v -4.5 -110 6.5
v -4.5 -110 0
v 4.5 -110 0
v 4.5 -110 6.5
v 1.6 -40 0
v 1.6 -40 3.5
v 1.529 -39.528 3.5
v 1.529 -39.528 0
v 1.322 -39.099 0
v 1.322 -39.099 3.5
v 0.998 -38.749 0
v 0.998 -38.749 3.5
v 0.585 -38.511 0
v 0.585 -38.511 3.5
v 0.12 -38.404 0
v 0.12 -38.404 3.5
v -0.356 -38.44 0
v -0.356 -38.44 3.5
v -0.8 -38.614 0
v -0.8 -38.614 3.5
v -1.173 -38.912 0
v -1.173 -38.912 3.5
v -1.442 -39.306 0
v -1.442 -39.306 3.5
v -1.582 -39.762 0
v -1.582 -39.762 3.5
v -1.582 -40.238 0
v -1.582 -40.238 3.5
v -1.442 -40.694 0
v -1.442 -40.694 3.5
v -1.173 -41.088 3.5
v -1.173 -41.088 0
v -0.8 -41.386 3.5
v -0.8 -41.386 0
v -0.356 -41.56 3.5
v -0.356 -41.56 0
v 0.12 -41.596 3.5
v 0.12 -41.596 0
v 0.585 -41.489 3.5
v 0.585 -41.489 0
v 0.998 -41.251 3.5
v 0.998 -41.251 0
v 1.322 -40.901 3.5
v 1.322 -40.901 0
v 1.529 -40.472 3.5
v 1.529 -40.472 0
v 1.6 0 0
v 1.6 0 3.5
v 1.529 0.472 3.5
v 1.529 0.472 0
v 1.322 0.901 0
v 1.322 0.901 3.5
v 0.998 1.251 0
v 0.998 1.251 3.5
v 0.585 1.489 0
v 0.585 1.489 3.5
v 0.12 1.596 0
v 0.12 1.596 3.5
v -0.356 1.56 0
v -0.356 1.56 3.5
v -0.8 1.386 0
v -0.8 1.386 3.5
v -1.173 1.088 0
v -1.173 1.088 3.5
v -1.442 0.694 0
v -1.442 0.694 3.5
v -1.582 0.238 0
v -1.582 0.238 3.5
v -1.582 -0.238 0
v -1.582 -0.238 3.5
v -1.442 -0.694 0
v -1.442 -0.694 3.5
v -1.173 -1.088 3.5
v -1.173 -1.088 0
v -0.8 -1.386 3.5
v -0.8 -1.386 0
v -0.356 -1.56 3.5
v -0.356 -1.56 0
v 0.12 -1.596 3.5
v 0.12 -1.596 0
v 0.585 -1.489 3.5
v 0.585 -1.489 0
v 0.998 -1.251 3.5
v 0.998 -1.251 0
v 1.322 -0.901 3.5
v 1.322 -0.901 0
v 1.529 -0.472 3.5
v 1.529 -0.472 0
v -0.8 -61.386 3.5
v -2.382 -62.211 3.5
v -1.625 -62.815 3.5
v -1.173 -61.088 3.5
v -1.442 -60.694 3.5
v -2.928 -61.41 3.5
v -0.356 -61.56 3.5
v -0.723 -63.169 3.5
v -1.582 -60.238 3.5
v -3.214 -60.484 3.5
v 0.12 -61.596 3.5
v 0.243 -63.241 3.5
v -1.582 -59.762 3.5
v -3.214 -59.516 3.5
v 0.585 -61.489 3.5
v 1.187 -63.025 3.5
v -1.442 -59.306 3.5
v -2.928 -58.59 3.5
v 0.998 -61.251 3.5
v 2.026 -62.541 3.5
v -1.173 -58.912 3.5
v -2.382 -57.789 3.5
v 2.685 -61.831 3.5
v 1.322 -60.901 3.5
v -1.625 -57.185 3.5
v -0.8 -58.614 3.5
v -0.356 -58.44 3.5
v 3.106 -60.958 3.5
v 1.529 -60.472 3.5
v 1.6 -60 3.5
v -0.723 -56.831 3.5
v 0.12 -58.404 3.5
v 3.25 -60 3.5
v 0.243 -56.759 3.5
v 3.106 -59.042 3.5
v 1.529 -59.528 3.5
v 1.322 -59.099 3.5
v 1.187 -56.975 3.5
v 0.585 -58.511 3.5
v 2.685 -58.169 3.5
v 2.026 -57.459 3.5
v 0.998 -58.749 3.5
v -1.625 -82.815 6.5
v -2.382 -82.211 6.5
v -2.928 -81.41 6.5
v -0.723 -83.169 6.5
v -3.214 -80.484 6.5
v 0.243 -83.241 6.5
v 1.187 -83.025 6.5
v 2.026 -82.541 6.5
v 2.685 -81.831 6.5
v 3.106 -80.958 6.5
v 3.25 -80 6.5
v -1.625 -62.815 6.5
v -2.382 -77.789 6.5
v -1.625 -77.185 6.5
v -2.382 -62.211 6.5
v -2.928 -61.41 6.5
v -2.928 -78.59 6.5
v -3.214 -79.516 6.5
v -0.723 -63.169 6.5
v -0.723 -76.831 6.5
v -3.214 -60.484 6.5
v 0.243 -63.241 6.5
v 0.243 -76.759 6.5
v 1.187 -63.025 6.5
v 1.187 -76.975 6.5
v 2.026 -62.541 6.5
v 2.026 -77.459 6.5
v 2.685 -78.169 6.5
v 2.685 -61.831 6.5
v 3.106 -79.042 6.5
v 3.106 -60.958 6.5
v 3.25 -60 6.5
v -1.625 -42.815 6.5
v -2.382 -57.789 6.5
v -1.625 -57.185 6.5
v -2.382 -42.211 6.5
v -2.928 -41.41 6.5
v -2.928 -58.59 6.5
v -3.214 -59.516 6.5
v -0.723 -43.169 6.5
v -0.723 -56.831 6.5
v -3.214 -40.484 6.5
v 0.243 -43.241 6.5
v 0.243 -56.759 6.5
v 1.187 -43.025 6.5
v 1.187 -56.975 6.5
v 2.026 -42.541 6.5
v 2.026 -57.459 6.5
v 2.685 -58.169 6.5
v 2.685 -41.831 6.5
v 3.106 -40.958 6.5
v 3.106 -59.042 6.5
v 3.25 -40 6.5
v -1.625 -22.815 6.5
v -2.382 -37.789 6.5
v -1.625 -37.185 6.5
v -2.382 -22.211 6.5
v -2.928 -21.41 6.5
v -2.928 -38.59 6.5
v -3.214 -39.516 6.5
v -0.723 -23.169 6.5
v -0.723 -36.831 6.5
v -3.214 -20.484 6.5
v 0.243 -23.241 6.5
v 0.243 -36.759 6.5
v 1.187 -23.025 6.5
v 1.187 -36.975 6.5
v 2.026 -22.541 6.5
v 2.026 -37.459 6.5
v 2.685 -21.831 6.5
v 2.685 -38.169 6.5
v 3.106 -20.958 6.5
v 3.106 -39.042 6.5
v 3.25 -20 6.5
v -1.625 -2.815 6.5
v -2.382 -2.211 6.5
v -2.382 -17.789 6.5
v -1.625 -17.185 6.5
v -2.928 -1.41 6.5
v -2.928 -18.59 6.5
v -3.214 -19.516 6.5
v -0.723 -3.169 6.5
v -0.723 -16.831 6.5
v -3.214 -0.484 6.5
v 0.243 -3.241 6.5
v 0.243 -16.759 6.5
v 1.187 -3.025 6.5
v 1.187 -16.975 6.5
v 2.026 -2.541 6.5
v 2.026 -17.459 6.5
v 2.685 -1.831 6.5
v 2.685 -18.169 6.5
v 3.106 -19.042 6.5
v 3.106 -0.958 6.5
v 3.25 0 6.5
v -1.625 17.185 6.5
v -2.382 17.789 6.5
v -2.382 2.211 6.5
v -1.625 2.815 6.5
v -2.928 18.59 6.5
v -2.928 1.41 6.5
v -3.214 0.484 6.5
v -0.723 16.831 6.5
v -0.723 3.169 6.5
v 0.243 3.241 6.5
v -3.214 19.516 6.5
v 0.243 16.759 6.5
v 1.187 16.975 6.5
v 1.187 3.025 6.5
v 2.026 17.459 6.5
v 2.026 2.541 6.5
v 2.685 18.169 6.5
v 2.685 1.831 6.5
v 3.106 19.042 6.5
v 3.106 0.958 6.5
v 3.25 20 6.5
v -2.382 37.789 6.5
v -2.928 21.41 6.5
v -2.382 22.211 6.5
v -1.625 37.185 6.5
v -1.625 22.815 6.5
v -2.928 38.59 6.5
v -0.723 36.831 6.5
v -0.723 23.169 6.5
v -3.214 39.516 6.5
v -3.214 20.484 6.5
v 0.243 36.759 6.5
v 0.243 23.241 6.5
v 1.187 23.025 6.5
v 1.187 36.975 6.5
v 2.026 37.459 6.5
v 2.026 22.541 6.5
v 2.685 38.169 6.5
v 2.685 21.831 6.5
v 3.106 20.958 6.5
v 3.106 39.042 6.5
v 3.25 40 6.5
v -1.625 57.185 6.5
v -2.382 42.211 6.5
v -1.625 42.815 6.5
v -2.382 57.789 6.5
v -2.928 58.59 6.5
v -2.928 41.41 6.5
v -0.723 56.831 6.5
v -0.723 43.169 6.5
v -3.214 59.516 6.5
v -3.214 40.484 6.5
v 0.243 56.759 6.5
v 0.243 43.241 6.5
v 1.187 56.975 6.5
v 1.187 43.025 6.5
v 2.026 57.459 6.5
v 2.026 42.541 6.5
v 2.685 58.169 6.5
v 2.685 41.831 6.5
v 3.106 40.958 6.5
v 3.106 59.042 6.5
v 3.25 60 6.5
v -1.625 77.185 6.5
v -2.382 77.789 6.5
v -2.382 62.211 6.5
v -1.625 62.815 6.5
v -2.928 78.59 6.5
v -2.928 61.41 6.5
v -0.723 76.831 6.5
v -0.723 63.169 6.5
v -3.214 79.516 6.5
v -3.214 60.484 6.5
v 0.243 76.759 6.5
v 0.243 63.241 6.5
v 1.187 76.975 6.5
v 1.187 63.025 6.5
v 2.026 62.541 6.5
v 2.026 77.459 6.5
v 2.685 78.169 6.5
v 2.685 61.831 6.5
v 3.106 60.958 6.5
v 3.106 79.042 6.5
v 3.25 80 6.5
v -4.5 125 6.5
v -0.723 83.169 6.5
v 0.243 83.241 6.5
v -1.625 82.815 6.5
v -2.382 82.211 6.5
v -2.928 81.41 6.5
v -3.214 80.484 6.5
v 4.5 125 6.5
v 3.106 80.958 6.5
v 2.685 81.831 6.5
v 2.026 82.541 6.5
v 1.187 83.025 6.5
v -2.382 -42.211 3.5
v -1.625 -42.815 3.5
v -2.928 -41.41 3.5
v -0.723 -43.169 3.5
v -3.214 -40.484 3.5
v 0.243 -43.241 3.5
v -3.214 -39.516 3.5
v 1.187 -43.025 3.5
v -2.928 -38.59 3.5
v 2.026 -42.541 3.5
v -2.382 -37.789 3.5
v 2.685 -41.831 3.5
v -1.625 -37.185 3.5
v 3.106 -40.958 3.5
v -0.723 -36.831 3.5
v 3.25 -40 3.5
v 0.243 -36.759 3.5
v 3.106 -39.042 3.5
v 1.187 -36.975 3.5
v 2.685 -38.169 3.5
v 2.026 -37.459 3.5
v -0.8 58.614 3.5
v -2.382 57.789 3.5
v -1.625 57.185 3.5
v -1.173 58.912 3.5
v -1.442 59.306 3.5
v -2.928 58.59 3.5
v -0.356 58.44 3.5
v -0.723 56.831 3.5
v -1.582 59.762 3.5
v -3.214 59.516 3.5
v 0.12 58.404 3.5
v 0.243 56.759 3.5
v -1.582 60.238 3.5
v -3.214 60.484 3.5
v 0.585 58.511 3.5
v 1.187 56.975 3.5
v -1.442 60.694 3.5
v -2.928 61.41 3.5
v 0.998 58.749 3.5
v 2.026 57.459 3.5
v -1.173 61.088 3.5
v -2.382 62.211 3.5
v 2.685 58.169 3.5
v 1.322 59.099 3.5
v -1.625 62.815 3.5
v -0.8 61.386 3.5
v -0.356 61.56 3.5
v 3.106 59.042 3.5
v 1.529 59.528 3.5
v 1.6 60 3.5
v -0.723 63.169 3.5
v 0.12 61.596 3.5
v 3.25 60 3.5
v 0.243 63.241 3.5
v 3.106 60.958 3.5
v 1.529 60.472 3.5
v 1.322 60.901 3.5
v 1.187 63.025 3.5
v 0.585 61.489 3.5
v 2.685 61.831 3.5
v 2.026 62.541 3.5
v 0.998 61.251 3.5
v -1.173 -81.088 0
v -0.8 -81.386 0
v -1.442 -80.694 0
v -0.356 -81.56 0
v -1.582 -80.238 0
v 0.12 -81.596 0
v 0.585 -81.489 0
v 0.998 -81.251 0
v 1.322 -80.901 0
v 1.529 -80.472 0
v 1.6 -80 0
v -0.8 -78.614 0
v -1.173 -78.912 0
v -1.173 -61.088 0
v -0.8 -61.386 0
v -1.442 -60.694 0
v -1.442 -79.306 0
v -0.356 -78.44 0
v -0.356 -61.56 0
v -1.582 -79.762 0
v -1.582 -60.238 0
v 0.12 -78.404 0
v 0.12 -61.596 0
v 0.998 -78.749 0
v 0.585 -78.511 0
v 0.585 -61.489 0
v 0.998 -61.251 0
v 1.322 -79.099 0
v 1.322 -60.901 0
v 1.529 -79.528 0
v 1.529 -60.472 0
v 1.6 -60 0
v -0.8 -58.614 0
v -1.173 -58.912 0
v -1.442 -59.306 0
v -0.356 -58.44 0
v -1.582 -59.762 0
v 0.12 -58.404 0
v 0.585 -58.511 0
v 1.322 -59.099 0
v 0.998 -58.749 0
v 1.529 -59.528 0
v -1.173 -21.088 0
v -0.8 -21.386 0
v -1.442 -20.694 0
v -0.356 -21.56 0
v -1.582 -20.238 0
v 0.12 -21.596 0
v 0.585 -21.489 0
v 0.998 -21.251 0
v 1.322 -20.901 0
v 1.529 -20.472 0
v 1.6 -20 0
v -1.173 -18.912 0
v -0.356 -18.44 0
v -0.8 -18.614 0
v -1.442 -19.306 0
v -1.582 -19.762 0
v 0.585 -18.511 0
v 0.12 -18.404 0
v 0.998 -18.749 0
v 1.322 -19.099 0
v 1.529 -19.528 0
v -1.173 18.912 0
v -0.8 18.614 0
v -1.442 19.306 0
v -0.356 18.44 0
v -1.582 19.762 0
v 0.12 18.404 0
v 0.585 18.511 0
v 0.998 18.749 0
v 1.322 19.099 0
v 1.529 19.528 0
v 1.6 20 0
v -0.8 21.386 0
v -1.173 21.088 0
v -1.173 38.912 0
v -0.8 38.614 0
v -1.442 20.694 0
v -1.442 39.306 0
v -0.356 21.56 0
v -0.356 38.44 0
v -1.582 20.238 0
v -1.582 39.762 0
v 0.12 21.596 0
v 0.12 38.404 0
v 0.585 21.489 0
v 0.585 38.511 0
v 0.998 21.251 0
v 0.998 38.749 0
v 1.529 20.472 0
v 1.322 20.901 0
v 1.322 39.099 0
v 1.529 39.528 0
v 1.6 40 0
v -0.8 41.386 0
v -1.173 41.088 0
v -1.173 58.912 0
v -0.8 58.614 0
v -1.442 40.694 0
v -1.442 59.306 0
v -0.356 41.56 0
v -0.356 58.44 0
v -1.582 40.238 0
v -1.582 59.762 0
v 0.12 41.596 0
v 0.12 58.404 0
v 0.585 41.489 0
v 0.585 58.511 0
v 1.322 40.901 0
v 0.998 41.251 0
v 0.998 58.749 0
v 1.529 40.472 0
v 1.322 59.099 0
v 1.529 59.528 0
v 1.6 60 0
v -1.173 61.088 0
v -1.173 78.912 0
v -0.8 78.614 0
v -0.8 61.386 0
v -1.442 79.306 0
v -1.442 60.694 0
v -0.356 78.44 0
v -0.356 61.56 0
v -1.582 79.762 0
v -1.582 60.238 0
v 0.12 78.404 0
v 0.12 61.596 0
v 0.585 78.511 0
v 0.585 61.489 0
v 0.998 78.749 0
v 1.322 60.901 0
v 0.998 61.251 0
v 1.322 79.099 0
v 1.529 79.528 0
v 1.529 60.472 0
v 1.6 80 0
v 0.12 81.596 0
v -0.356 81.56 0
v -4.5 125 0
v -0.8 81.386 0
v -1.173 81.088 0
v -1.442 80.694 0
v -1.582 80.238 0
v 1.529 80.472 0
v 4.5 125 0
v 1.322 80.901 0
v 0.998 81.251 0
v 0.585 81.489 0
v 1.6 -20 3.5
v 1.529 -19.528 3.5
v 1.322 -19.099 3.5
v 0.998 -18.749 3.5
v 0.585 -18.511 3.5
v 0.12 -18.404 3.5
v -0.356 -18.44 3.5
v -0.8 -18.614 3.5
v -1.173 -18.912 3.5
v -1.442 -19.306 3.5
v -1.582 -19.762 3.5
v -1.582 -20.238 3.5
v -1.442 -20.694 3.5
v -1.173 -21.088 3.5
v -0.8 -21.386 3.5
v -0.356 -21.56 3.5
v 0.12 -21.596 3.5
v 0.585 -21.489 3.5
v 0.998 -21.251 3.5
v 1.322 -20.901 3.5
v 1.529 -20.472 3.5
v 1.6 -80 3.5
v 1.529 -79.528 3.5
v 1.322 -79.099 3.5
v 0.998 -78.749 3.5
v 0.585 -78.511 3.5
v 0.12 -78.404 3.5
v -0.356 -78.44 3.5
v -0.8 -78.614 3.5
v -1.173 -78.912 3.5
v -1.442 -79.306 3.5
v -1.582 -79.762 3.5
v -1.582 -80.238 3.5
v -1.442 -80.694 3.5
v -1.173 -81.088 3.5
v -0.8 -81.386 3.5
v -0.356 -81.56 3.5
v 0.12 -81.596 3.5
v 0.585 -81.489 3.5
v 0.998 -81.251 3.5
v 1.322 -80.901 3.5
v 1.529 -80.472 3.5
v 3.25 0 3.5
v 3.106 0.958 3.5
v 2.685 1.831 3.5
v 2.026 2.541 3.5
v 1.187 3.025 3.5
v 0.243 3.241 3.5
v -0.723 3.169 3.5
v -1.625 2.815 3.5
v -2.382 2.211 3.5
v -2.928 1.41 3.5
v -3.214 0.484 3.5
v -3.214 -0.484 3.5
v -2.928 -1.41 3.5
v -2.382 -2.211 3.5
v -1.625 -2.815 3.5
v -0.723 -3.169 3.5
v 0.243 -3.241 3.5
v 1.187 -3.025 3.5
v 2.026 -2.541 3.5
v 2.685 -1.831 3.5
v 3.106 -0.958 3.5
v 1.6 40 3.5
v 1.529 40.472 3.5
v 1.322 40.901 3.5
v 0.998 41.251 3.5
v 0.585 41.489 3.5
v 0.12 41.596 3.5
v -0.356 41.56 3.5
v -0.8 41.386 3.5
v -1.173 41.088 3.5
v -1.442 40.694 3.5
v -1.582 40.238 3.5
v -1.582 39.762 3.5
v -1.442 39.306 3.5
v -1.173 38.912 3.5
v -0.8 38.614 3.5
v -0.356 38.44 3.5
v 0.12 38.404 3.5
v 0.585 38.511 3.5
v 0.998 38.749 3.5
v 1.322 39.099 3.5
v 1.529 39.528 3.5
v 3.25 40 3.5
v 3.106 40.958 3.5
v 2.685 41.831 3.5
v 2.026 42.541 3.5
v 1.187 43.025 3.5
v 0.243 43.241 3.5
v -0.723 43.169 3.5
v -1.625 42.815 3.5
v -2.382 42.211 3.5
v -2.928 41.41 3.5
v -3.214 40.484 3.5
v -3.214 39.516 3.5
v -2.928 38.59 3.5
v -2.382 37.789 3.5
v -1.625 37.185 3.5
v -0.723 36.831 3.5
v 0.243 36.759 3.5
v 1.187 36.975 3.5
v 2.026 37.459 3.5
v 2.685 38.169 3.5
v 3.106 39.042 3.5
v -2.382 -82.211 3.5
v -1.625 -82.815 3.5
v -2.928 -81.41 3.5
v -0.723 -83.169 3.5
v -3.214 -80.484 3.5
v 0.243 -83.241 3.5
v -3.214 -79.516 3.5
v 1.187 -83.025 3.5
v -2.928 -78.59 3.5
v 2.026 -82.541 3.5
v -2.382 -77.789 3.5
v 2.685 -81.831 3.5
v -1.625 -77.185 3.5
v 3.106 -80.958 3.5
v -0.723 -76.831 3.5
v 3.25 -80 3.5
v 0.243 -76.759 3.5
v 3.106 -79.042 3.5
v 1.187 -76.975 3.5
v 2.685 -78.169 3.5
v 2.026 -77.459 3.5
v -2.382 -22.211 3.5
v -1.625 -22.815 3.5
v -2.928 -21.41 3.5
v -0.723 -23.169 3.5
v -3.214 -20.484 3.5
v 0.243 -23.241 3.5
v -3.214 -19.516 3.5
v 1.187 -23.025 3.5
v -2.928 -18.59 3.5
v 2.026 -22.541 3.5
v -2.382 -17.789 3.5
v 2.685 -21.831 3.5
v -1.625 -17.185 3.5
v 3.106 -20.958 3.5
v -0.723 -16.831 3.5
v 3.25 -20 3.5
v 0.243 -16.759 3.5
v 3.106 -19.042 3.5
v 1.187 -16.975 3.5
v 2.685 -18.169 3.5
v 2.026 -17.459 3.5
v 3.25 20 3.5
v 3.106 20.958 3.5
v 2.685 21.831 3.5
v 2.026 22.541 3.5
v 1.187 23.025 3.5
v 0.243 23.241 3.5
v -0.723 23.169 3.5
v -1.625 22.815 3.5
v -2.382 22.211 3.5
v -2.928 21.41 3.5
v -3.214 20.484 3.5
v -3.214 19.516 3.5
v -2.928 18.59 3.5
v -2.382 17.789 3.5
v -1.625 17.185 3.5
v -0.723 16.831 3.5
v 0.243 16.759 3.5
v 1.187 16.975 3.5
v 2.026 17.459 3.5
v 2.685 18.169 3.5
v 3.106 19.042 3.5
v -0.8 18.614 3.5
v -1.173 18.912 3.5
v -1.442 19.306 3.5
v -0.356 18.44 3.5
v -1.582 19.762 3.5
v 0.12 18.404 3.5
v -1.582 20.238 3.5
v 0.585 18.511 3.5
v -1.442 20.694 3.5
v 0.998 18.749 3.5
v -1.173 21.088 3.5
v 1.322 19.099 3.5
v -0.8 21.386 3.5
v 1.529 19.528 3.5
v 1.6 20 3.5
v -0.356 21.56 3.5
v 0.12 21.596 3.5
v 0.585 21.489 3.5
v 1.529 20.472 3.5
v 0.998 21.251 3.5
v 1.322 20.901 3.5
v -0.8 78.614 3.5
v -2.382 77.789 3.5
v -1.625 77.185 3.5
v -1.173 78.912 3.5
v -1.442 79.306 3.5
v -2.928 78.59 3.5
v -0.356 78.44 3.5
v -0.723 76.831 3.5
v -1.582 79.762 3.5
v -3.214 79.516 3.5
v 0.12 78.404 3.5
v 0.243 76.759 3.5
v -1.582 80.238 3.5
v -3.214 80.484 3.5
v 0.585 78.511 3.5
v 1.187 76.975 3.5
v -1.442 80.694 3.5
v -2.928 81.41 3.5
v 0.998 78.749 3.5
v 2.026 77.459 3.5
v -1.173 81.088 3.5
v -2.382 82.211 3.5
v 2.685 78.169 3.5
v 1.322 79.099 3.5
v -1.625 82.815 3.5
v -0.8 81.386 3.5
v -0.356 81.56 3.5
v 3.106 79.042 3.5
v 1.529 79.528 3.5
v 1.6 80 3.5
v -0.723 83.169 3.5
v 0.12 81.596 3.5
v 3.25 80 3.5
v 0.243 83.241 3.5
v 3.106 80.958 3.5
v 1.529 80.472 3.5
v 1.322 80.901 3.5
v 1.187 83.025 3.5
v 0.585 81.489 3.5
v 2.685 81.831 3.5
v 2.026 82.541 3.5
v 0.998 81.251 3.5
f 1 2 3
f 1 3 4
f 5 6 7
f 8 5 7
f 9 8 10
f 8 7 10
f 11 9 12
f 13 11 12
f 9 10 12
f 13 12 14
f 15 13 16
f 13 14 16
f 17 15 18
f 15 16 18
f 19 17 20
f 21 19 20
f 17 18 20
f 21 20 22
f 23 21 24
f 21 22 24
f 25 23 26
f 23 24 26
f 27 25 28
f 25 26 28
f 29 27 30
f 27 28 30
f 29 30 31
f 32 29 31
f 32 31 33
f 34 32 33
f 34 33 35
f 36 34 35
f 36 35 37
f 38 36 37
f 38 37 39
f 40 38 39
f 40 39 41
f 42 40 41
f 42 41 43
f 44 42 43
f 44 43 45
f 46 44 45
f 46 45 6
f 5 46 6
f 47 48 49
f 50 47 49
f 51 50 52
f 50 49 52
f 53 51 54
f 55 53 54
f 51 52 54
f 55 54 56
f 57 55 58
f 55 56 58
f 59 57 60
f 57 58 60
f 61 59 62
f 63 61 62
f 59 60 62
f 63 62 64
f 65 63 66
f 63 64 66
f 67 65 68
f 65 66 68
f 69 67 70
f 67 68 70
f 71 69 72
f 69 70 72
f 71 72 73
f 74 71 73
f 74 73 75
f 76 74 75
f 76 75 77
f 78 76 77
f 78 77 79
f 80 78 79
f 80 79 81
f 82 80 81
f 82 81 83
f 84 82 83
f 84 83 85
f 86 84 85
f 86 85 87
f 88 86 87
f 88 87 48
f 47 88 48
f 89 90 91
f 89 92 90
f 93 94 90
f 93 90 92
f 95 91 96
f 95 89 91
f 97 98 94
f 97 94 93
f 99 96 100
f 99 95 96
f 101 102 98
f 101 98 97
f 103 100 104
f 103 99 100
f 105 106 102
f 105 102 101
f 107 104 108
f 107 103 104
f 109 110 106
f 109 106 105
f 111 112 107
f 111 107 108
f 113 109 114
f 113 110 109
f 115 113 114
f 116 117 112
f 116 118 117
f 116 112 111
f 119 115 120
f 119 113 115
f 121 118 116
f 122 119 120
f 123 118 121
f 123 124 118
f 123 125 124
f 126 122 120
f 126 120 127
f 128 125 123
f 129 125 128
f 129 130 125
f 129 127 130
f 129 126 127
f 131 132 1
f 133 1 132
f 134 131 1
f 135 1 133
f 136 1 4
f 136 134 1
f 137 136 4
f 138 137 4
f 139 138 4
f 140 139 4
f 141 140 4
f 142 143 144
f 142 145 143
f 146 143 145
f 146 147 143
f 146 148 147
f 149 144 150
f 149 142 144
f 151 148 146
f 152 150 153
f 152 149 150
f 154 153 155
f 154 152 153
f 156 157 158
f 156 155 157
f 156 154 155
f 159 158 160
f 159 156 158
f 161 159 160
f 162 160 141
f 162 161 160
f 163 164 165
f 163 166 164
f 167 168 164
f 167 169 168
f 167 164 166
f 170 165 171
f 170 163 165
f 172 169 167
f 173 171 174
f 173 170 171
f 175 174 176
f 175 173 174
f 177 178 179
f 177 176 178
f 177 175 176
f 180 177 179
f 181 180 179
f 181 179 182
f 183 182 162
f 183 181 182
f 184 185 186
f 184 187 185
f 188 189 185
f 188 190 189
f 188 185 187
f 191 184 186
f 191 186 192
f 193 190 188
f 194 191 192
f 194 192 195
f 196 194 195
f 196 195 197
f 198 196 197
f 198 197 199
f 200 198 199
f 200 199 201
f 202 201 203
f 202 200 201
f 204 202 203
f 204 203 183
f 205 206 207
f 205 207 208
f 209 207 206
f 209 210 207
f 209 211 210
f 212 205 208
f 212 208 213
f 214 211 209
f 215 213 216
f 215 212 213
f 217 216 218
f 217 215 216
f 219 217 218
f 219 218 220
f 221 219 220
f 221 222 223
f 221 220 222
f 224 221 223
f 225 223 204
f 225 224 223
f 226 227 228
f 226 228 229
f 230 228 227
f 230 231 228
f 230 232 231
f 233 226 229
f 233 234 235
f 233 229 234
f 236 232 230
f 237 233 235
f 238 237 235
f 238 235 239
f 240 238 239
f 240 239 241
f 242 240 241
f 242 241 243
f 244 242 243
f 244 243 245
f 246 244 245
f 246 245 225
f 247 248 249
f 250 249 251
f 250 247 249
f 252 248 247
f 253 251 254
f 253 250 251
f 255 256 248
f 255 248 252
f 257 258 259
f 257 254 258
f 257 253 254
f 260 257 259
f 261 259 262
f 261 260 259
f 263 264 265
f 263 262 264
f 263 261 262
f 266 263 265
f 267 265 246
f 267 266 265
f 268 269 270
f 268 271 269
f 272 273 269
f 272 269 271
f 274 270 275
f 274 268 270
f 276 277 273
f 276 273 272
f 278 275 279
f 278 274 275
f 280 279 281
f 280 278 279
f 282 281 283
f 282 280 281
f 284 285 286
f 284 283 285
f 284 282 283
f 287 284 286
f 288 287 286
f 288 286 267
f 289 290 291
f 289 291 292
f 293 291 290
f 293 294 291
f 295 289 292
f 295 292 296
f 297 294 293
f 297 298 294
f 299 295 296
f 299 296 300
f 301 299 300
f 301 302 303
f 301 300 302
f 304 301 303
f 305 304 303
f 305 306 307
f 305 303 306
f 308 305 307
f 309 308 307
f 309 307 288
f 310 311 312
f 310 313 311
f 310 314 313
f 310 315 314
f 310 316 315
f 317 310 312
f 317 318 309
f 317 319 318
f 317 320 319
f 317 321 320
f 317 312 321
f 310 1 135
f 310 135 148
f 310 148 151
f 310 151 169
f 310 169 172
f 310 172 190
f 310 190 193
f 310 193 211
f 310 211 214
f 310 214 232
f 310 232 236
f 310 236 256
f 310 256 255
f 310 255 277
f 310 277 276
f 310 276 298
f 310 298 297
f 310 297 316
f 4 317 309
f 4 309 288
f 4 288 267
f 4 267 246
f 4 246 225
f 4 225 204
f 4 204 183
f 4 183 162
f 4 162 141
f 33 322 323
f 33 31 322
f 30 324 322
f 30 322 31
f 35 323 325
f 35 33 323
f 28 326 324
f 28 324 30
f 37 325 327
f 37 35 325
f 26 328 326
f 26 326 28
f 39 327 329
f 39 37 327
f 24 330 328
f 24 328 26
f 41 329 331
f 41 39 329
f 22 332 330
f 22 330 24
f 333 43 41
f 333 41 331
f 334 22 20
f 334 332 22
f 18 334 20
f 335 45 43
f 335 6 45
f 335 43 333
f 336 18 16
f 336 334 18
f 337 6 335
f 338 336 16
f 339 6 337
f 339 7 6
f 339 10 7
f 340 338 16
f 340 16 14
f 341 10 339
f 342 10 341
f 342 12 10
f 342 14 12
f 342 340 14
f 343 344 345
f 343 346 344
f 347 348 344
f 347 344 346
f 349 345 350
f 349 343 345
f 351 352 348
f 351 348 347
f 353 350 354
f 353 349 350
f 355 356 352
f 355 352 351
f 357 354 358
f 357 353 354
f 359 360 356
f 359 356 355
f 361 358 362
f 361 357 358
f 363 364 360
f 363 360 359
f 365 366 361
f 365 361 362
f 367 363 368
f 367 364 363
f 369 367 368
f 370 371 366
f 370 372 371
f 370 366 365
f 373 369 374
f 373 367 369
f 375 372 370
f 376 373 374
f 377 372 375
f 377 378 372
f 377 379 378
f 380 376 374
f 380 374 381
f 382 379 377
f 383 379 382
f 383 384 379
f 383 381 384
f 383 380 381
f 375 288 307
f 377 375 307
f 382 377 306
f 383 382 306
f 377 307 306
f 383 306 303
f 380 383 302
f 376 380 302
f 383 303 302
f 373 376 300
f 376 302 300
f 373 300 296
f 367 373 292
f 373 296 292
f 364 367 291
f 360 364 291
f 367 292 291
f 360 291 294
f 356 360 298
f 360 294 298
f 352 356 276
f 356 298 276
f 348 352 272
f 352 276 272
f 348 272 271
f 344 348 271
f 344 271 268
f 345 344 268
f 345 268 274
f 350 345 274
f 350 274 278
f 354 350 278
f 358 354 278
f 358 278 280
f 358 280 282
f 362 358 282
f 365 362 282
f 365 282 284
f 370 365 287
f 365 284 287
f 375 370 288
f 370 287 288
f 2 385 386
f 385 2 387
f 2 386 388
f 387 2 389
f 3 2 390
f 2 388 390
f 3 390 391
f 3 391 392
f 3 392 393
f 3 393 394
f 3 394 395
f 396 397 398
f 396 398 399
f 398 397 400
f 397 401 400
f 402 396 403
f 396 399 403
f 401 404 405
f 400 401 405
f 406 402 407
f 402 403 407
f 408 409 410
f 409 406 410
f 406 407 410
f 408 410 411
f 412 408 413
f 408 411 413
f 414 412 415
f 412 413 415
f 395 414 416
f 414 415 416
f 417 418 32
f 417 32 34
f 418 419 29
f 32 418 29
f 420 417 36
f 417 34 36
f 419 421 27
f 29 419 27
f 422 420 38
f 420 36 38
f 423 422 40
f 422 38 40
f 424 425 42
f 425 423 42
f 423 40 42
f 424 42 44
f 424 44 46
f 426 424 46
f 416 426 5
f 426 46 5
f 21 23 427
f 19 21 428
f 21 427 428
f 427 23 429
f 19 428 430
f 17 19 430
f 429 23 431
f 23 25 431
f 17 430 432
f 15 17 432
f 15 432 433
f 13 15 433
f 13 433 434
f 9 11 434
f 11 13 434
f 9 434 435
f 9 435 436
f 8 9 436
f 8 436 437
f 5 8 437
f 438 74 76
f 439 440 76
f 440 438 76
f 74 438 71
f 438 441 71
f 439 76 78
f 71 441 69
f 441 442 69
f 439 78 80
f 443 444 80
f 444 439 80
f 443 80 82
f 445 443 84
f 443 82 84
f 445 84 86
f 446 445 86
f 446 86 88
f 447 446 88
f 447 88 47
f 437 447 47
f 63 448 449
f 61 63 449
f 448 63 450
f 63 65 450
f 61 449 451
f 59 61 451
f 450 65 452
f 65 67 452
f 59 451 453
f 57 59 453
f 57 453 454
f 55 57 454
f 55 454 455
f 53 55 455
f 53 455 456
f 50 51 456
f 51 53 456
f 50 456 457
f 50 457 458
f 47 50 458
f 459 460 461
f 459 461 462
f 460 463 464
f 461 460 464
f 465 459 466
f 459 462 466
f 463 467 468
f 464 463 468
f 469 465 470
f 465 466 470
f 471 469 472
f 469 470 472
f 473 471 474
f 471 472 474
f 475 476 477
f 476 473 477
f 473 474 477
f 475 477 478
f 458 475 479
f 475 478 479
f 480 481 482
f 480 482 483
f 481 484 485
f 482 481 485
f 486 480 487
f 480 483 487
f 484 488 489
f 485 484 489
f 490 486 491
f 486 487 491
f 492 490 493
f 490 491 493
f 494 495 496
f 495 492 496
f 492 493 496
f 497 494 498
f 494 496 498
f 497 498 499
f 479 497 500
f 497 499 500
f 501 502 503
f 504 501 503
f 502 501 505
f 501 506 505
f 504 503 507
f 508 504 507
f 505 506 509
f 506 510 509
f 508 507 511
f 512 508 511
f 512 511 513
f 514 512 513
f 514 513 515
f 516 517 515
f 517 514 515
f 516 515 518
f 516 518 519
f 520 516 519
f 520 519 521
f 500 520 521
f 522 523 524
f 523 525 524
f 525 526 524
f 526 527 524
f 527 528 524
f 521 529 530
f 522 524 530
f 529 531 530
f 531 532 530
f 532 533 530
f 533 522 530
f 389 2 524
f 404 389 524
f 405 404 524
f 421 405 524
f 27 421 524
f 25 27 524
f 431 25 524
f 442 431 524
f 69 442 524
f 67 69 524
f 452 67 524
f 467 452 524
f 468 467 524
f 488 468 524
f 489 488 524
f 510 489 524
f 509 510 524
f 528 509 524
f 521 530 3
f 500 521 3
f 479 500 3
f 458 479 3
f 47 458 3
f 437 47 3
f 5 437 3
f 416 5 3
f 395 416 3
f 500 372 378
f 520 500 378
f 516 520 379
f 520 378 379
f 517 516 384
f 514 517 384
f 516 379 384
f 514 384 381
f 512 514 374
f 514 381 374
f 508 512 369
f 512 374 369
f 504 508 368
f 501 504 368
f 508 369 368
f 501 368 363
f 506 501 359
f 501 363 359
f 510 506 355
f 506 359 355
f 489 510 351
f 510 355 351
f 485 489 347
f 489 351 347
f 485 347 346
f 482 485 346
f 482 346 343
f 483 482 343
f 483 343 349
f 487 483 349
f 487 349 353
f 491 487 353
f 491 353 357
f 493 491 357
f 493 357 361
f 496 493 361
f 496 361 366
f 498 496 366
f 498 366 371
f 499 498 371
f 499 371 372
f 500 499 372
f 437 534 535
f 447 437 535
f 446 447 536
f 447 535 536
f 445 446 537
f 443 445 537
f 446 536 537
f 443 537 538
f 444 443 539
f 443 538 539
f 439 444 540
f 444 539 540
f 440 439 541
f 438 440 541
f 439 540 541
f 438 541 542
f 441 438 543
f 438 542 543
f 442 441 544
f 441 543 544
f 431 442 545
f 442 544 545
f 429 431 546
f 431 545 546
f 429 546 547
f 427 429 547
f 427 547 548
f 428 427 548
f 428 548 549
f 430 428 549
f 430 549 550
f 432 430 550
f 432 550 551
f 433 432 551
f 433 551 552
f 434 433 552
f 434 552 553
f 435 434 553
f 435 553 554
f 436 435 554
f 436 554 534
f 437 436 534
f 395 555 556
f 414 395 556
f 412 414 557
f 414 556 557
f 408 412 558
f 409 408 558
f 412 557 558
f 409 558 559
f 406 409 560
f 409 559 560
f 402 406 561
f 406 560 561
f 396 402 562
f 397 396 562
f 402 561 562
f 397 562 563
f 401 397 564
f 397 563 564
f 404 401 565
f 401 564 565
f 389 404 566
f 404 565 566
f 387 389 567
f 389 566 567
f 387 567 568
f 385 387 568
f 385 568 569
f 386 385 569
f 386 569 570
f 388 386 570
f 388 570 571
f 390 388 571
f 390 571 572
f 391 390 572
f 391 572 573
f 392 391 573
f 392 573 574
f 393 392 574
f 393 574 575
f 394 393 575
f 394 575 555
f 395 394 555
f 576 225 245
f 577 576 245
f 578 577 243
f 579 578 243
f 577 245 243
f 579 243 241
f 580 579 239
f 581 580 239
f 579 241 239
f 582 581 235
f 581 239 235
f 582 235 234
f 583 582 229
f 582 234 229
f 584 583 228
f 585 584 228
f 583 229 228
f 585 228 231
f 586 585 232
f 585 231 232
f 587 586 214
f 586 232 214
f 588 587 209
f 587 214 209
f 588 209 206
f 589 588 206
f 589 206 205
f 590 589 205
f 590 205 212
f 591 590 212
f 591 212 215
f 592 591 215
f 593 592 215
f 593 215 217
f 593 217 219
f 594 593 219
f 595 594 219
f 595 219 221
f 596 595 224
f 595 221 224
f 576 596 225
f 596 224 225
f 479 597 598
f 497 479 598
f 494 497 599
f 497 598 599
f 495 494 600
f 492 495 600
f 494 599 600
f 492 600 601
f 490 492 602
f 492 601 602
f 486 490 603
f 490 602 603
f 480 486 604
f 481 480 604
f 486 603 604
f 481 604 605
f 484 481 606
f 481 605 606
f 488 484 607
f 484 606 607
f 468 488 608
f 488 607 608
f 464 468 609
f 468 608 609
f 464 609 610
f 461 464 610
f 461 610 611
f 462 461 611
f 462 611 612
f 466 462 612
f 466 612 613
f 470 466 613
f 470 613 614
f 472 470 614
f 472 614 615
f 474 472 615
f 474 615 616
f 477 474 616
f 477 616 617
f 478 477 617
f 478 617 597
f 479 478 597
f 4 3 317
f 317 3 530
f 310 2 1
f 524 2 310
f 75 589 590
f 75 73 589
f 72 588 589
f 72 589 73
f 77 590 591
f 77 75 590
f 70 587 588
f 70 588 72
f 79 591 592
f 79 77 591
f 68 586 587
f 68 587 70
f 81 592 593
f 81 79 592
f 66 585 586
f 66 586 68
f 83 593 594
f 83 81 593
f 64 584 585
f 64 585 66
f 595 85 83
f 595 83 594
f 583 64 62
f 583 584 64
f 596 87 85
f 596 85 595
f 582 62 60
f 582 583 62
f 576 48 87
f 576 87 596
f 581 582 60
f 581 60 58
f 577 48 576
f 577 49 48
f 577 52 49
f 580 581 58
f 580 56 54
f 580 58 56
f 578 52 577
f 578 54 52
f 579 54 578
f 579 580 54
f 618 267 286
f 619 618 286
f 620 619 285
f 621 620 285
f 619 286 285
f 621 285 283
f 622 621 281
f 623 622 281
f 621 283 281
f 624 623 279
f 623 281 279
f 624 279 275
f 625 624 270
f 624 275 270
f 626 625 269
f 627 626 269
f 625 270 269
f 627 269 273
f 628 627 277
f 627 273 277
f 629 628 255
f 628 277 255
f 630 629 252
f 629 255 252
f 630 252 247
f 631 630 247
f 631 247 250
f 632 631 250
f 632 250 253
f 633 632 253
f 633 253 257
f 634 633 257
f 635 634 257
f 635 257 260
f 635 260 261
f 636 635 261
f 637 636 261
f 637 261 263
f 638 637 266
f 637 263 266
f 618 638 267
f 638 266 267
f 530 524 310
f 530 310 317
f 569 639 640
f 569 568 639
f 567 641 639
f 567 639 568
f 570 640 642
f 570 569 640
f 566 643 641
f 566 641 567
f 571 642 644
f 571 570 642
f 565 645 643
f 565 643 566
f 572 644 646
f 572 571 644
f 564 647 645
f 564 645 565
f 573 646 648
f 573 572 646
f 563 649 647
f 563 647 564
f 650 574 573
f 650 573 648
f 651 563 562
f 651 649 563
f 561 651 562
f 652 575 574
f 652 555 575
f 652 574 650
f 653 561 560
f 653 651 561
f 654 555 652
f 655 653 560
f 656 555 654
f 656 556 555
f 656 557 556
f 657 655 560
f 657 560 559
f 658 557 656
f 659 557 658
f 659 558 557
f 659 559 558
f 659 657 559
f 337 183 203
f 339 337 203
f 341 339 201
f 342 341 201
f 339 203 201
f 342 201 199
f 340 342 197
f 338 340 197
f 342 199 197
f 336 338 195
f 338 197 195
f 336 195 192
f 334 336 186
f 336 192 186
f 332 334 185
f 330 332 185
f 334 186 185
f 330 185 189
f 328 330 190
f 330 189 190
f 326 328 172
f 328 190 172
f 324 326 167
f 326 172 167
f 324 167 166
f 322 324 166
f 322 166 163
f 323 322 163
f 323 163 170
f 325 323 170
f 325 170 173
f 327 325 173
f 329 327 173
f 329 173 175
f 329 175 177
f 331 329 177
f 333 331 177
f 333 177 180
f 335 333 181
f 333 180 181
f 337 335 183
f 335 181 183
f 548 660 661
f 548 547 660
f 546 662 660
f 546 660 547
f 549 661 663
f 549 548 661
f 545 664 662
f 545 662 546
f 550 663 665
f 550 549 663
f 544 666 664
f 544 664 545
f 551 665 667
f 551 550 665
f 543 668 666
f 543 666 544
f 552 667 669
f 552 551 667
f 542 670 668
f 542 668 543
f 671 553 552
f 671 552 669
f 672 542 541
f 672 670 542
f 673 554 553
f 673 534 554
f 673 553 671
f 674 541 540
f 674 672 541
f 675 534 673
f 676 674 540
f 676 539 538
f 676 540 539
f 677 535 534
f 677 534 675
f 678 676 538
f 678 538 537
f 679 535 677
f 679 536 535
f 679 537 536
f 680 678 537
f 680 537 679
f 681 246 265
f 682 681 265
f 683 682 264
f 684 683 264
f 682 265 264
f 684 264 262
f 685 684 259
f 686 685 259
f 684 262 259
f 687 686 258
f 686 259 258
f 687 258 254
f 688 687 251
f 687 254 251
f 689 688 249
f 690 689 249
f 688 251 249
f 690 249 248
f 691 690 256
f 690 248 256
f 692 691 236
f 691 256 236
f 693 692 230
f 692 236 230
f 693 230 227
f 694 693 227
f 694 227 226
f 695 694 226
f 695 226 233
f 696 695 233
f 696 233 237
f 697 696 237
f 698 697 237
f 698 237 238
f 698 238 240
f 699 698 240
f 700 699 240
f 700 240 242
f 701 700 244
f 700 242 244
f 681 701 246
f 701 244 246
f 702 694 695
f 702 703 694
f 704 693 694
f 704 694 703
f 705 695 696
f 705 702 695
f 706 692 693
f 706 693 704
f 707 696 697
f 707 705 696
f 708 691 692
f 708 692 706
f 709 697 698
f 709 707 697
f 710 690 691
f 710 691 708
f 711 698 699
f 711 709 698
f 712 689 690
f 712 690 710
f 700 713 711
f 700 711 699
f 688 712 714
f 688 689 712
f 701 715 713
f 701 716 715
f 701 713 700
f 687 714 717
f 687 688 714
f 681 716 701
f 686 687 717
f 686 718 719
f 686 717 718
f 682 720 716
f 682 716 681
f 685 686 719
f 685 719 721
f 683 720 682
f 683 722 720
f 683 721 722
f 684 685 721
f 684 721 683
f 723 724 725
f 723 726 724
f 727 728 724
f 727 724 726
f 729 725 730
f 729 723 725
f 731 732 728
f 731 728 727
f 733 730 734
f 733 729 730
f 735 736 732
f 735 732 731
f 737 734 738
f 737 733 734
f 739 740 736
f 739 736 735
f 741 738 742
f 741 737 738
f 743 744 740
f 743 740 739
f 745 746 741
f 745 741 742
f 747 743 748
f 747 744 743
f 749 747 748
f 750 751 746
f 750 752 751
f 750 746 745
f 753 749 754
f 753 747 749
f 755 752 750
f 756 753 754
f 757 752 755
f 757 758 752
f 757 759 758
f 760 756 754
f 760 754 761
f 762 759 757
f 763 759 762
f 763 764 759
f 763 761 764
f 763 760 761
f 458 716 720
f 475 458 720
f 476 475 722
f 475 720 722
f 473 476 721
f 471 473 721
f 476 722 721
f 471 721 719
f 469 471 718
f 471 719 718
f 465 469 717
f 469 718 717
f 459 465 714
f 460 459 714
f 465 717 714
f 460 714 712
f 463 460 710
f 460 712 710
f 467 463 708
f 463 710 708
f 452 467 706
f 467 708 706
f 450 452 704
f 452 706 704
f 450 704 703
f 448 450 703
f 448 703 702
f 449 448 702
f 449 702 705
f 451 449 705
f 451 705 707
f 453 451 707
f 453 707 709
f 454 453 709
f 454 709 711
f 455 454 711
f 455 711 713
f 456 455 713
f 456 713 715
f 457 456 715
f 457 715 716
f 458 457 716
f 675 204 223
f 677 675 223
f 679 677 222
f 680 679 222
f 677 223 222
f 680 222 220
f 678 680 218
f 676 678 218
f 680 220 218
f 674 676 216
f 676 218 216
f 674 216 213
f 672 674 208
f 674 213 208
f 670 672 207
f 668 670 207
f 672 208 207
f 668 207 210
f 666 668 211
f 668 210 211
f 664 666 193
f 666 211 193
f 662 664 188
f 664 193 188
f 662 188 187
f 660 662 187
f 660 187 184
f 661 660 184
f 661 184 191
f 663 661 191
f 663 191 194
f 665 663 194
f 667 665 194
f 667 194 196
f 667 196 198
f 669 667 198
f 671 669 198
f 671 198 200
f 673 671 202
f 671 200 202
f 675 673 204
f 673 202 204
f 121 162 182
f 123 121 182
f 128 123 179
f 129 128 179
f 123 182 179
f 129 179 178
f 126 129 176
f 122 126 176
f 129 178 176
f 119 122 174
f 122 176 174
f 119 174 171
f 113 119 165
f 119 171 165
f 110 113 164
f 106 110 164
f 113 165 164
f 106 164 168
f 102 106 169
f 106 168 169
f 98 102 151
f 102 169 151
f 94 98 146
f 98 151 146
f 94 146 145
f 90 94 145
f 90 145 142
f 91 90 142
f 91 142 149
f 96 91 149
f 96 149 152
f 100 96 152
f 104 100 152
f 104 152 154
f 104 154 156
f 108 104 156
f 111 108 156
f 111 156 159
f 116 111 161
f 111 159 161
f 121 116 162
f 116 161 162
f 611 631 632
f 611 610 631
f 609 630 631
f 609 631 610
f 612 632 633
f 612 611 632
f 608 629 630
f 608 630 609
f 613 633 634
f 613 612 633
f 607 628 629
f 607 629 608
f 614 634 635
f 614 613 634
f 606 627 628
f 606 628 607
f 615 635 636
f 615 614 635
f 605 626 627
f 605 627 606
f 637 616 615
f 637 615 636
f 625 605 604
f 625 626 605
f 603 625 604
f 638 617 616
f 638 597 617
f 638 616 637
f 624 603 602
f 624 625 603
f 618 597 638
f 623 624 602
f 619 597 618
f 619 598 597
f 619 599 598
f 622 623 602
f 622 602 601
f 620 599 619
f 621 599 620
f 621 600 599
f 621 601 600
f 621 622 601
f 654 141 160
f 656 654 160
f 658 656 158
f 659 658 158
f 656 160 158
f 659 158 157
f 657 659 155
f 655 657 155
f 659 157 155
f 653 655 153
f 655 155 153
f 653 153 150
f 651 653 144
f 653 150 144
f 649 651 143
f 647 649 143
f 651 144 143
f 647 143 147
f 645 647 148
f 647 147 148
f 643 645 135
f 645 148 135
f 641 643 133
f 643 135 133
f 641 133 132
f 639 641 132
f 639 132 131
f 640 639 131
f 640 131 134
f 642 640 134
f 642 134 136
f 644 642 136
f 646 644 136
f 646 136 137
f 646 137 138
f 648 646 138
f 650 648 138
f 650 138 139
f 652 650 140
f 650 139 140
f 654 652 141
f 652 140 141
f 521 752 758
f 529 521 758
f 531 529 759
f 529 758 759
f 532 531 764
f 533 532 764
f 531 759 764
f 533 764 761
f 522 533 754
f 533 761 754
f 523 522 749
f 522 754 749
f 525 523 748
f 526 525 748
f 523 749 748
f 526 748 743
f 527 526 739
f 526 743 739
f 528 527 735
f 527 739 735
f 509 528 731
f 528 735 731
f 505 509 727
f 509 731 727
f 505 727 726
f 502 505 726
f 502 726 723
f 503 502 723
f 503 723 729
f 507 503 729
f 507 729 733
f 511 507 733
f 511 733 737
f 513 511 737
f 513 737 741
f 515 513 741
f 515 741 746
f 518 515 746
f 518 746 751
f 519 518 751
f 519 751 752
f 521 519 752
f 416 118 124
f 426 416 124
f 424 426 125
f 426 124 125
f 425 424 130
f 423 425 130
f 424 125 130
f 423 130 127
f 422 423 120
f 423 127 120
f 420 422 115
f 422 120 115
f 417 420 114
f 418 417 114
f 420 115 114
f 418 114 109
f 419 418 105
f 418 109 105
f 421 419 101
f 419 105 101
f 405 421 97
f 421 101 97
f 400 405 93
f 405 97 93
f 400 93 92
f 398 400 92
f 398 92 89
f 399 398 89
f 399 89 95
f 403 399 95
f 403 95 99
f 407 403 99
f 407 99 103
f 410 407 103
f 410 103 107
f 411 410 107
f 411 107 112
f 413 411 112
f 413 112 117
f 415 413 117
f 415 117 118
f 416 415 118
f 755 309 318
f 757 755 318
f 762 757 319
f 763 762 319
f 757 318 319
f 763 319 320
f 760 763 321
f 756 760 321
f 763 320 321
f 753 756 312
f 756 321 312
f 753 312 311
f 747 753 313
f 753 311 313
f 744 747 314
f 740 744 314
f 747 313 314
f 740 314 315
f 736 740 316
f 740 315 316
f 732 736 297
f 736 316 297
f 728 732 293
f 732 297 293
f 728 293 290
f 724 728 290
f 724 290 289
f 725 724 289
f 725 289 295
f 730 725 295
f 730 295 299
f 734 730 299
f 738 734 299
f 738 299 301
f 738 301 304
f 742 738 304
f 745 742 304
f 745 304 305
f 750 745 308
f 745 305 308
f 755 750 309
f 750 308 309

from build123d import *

# Parameters (mm, degrees)
SKETCH_1_W          = 9
SKETCH_1_H          = 250
EXTRUDE_1_DEPTH     = 6.5
SKETCH_2_R          = 1.6
CUT_EXTRUDE_1_DEPTH = 126.249750499
SKETCH_3_R          = 3.25
CUT_EXTRUDE_2_DEPTH = 3
SKETCH_4_W          = 6.5
SKETCH_4_H          = 15
CUT_EXTRUDE_3_DEPTH = 10


with BuildPart() as part:
    # 草图1 → 凸台-拉伸1 (new body)
    with BuildSketch(Plane.XY):
        Rectangle(SKETCH_1_W, SKETCH_1_H)
    extrude(amount=EXTRUDE_1_DEPTH)

    # 草图2 → 切除-拉伸1 (cut, through all)
    with BuildSketch(Plane.XY.offset(6.5)):
        Circle(SKETCH_2_R)
        with Locations((0, 20)):
            Circle(SKETCH_2_R)
        with Locations((0, 40)):
            Circle(SKETCH_2_R)
        with Locations((0, 60)):
            Circle(SKETCH_2_R)
        with Locations((0, 80)):
            Circle(SKETCH_2_R)
        with Locations((0, -20)):
            Circle(SKETCH_2_R)
        with Locations((0, -40)):
            Circle(SKETCH_2_R)
        with Locations((0, -60)):
            Circle(SKETCH_2_R)
        with Locations((0, -80)):
            Circle(SKETCH_2_R)
    extrude(amount=-CUT_EXTRUDE_1_DEPTH, mode=Mode.SUBTRACT)

    # 草图3 → 切除-拉伸2 (cut)
    with BuildSketch(Plane.XY.offset(6.5)):
        with Locations((0, 80)):
            Circle(SKETCH_3_R)
        with Locations((0, 60)):
            Circle(SKETCH_3_R)
        with Locations((0, 40)):
            Circle(SKETCH_3_R)
        with Locations((0, 20)):
            Circle(SKETCH_3_R)
        Circle(SKETCH_3_R)
        with Locations((0, -20)):
            Circle(SKETCH_3_R)
        with Locations((0, -40)):
            Circle(SKETCH_3_R)
        with Locations((0, -60)):
            Circle(SKETCH_3_R)
        with Locations((0, -80)):
            Circle(SKETCH_3_R)
    extrude(amount=-CUT_EXTRUDE_2_DEPTH, mode=Mode.SUBTRACT)

    # 草图4 → 切除-拉伸3 (cut)
    with BuildSketch(Plane.ZY.offset(4.5)):
        with Locations((3.25, -117.5)):
            Rectangle(SKETCH_4_W, SKETCH_4_H)
    extrude(amount=-CUT_EXTRUDE_3_DEPTH, mode=Mode.SUBTRACT)


solid = part.part
